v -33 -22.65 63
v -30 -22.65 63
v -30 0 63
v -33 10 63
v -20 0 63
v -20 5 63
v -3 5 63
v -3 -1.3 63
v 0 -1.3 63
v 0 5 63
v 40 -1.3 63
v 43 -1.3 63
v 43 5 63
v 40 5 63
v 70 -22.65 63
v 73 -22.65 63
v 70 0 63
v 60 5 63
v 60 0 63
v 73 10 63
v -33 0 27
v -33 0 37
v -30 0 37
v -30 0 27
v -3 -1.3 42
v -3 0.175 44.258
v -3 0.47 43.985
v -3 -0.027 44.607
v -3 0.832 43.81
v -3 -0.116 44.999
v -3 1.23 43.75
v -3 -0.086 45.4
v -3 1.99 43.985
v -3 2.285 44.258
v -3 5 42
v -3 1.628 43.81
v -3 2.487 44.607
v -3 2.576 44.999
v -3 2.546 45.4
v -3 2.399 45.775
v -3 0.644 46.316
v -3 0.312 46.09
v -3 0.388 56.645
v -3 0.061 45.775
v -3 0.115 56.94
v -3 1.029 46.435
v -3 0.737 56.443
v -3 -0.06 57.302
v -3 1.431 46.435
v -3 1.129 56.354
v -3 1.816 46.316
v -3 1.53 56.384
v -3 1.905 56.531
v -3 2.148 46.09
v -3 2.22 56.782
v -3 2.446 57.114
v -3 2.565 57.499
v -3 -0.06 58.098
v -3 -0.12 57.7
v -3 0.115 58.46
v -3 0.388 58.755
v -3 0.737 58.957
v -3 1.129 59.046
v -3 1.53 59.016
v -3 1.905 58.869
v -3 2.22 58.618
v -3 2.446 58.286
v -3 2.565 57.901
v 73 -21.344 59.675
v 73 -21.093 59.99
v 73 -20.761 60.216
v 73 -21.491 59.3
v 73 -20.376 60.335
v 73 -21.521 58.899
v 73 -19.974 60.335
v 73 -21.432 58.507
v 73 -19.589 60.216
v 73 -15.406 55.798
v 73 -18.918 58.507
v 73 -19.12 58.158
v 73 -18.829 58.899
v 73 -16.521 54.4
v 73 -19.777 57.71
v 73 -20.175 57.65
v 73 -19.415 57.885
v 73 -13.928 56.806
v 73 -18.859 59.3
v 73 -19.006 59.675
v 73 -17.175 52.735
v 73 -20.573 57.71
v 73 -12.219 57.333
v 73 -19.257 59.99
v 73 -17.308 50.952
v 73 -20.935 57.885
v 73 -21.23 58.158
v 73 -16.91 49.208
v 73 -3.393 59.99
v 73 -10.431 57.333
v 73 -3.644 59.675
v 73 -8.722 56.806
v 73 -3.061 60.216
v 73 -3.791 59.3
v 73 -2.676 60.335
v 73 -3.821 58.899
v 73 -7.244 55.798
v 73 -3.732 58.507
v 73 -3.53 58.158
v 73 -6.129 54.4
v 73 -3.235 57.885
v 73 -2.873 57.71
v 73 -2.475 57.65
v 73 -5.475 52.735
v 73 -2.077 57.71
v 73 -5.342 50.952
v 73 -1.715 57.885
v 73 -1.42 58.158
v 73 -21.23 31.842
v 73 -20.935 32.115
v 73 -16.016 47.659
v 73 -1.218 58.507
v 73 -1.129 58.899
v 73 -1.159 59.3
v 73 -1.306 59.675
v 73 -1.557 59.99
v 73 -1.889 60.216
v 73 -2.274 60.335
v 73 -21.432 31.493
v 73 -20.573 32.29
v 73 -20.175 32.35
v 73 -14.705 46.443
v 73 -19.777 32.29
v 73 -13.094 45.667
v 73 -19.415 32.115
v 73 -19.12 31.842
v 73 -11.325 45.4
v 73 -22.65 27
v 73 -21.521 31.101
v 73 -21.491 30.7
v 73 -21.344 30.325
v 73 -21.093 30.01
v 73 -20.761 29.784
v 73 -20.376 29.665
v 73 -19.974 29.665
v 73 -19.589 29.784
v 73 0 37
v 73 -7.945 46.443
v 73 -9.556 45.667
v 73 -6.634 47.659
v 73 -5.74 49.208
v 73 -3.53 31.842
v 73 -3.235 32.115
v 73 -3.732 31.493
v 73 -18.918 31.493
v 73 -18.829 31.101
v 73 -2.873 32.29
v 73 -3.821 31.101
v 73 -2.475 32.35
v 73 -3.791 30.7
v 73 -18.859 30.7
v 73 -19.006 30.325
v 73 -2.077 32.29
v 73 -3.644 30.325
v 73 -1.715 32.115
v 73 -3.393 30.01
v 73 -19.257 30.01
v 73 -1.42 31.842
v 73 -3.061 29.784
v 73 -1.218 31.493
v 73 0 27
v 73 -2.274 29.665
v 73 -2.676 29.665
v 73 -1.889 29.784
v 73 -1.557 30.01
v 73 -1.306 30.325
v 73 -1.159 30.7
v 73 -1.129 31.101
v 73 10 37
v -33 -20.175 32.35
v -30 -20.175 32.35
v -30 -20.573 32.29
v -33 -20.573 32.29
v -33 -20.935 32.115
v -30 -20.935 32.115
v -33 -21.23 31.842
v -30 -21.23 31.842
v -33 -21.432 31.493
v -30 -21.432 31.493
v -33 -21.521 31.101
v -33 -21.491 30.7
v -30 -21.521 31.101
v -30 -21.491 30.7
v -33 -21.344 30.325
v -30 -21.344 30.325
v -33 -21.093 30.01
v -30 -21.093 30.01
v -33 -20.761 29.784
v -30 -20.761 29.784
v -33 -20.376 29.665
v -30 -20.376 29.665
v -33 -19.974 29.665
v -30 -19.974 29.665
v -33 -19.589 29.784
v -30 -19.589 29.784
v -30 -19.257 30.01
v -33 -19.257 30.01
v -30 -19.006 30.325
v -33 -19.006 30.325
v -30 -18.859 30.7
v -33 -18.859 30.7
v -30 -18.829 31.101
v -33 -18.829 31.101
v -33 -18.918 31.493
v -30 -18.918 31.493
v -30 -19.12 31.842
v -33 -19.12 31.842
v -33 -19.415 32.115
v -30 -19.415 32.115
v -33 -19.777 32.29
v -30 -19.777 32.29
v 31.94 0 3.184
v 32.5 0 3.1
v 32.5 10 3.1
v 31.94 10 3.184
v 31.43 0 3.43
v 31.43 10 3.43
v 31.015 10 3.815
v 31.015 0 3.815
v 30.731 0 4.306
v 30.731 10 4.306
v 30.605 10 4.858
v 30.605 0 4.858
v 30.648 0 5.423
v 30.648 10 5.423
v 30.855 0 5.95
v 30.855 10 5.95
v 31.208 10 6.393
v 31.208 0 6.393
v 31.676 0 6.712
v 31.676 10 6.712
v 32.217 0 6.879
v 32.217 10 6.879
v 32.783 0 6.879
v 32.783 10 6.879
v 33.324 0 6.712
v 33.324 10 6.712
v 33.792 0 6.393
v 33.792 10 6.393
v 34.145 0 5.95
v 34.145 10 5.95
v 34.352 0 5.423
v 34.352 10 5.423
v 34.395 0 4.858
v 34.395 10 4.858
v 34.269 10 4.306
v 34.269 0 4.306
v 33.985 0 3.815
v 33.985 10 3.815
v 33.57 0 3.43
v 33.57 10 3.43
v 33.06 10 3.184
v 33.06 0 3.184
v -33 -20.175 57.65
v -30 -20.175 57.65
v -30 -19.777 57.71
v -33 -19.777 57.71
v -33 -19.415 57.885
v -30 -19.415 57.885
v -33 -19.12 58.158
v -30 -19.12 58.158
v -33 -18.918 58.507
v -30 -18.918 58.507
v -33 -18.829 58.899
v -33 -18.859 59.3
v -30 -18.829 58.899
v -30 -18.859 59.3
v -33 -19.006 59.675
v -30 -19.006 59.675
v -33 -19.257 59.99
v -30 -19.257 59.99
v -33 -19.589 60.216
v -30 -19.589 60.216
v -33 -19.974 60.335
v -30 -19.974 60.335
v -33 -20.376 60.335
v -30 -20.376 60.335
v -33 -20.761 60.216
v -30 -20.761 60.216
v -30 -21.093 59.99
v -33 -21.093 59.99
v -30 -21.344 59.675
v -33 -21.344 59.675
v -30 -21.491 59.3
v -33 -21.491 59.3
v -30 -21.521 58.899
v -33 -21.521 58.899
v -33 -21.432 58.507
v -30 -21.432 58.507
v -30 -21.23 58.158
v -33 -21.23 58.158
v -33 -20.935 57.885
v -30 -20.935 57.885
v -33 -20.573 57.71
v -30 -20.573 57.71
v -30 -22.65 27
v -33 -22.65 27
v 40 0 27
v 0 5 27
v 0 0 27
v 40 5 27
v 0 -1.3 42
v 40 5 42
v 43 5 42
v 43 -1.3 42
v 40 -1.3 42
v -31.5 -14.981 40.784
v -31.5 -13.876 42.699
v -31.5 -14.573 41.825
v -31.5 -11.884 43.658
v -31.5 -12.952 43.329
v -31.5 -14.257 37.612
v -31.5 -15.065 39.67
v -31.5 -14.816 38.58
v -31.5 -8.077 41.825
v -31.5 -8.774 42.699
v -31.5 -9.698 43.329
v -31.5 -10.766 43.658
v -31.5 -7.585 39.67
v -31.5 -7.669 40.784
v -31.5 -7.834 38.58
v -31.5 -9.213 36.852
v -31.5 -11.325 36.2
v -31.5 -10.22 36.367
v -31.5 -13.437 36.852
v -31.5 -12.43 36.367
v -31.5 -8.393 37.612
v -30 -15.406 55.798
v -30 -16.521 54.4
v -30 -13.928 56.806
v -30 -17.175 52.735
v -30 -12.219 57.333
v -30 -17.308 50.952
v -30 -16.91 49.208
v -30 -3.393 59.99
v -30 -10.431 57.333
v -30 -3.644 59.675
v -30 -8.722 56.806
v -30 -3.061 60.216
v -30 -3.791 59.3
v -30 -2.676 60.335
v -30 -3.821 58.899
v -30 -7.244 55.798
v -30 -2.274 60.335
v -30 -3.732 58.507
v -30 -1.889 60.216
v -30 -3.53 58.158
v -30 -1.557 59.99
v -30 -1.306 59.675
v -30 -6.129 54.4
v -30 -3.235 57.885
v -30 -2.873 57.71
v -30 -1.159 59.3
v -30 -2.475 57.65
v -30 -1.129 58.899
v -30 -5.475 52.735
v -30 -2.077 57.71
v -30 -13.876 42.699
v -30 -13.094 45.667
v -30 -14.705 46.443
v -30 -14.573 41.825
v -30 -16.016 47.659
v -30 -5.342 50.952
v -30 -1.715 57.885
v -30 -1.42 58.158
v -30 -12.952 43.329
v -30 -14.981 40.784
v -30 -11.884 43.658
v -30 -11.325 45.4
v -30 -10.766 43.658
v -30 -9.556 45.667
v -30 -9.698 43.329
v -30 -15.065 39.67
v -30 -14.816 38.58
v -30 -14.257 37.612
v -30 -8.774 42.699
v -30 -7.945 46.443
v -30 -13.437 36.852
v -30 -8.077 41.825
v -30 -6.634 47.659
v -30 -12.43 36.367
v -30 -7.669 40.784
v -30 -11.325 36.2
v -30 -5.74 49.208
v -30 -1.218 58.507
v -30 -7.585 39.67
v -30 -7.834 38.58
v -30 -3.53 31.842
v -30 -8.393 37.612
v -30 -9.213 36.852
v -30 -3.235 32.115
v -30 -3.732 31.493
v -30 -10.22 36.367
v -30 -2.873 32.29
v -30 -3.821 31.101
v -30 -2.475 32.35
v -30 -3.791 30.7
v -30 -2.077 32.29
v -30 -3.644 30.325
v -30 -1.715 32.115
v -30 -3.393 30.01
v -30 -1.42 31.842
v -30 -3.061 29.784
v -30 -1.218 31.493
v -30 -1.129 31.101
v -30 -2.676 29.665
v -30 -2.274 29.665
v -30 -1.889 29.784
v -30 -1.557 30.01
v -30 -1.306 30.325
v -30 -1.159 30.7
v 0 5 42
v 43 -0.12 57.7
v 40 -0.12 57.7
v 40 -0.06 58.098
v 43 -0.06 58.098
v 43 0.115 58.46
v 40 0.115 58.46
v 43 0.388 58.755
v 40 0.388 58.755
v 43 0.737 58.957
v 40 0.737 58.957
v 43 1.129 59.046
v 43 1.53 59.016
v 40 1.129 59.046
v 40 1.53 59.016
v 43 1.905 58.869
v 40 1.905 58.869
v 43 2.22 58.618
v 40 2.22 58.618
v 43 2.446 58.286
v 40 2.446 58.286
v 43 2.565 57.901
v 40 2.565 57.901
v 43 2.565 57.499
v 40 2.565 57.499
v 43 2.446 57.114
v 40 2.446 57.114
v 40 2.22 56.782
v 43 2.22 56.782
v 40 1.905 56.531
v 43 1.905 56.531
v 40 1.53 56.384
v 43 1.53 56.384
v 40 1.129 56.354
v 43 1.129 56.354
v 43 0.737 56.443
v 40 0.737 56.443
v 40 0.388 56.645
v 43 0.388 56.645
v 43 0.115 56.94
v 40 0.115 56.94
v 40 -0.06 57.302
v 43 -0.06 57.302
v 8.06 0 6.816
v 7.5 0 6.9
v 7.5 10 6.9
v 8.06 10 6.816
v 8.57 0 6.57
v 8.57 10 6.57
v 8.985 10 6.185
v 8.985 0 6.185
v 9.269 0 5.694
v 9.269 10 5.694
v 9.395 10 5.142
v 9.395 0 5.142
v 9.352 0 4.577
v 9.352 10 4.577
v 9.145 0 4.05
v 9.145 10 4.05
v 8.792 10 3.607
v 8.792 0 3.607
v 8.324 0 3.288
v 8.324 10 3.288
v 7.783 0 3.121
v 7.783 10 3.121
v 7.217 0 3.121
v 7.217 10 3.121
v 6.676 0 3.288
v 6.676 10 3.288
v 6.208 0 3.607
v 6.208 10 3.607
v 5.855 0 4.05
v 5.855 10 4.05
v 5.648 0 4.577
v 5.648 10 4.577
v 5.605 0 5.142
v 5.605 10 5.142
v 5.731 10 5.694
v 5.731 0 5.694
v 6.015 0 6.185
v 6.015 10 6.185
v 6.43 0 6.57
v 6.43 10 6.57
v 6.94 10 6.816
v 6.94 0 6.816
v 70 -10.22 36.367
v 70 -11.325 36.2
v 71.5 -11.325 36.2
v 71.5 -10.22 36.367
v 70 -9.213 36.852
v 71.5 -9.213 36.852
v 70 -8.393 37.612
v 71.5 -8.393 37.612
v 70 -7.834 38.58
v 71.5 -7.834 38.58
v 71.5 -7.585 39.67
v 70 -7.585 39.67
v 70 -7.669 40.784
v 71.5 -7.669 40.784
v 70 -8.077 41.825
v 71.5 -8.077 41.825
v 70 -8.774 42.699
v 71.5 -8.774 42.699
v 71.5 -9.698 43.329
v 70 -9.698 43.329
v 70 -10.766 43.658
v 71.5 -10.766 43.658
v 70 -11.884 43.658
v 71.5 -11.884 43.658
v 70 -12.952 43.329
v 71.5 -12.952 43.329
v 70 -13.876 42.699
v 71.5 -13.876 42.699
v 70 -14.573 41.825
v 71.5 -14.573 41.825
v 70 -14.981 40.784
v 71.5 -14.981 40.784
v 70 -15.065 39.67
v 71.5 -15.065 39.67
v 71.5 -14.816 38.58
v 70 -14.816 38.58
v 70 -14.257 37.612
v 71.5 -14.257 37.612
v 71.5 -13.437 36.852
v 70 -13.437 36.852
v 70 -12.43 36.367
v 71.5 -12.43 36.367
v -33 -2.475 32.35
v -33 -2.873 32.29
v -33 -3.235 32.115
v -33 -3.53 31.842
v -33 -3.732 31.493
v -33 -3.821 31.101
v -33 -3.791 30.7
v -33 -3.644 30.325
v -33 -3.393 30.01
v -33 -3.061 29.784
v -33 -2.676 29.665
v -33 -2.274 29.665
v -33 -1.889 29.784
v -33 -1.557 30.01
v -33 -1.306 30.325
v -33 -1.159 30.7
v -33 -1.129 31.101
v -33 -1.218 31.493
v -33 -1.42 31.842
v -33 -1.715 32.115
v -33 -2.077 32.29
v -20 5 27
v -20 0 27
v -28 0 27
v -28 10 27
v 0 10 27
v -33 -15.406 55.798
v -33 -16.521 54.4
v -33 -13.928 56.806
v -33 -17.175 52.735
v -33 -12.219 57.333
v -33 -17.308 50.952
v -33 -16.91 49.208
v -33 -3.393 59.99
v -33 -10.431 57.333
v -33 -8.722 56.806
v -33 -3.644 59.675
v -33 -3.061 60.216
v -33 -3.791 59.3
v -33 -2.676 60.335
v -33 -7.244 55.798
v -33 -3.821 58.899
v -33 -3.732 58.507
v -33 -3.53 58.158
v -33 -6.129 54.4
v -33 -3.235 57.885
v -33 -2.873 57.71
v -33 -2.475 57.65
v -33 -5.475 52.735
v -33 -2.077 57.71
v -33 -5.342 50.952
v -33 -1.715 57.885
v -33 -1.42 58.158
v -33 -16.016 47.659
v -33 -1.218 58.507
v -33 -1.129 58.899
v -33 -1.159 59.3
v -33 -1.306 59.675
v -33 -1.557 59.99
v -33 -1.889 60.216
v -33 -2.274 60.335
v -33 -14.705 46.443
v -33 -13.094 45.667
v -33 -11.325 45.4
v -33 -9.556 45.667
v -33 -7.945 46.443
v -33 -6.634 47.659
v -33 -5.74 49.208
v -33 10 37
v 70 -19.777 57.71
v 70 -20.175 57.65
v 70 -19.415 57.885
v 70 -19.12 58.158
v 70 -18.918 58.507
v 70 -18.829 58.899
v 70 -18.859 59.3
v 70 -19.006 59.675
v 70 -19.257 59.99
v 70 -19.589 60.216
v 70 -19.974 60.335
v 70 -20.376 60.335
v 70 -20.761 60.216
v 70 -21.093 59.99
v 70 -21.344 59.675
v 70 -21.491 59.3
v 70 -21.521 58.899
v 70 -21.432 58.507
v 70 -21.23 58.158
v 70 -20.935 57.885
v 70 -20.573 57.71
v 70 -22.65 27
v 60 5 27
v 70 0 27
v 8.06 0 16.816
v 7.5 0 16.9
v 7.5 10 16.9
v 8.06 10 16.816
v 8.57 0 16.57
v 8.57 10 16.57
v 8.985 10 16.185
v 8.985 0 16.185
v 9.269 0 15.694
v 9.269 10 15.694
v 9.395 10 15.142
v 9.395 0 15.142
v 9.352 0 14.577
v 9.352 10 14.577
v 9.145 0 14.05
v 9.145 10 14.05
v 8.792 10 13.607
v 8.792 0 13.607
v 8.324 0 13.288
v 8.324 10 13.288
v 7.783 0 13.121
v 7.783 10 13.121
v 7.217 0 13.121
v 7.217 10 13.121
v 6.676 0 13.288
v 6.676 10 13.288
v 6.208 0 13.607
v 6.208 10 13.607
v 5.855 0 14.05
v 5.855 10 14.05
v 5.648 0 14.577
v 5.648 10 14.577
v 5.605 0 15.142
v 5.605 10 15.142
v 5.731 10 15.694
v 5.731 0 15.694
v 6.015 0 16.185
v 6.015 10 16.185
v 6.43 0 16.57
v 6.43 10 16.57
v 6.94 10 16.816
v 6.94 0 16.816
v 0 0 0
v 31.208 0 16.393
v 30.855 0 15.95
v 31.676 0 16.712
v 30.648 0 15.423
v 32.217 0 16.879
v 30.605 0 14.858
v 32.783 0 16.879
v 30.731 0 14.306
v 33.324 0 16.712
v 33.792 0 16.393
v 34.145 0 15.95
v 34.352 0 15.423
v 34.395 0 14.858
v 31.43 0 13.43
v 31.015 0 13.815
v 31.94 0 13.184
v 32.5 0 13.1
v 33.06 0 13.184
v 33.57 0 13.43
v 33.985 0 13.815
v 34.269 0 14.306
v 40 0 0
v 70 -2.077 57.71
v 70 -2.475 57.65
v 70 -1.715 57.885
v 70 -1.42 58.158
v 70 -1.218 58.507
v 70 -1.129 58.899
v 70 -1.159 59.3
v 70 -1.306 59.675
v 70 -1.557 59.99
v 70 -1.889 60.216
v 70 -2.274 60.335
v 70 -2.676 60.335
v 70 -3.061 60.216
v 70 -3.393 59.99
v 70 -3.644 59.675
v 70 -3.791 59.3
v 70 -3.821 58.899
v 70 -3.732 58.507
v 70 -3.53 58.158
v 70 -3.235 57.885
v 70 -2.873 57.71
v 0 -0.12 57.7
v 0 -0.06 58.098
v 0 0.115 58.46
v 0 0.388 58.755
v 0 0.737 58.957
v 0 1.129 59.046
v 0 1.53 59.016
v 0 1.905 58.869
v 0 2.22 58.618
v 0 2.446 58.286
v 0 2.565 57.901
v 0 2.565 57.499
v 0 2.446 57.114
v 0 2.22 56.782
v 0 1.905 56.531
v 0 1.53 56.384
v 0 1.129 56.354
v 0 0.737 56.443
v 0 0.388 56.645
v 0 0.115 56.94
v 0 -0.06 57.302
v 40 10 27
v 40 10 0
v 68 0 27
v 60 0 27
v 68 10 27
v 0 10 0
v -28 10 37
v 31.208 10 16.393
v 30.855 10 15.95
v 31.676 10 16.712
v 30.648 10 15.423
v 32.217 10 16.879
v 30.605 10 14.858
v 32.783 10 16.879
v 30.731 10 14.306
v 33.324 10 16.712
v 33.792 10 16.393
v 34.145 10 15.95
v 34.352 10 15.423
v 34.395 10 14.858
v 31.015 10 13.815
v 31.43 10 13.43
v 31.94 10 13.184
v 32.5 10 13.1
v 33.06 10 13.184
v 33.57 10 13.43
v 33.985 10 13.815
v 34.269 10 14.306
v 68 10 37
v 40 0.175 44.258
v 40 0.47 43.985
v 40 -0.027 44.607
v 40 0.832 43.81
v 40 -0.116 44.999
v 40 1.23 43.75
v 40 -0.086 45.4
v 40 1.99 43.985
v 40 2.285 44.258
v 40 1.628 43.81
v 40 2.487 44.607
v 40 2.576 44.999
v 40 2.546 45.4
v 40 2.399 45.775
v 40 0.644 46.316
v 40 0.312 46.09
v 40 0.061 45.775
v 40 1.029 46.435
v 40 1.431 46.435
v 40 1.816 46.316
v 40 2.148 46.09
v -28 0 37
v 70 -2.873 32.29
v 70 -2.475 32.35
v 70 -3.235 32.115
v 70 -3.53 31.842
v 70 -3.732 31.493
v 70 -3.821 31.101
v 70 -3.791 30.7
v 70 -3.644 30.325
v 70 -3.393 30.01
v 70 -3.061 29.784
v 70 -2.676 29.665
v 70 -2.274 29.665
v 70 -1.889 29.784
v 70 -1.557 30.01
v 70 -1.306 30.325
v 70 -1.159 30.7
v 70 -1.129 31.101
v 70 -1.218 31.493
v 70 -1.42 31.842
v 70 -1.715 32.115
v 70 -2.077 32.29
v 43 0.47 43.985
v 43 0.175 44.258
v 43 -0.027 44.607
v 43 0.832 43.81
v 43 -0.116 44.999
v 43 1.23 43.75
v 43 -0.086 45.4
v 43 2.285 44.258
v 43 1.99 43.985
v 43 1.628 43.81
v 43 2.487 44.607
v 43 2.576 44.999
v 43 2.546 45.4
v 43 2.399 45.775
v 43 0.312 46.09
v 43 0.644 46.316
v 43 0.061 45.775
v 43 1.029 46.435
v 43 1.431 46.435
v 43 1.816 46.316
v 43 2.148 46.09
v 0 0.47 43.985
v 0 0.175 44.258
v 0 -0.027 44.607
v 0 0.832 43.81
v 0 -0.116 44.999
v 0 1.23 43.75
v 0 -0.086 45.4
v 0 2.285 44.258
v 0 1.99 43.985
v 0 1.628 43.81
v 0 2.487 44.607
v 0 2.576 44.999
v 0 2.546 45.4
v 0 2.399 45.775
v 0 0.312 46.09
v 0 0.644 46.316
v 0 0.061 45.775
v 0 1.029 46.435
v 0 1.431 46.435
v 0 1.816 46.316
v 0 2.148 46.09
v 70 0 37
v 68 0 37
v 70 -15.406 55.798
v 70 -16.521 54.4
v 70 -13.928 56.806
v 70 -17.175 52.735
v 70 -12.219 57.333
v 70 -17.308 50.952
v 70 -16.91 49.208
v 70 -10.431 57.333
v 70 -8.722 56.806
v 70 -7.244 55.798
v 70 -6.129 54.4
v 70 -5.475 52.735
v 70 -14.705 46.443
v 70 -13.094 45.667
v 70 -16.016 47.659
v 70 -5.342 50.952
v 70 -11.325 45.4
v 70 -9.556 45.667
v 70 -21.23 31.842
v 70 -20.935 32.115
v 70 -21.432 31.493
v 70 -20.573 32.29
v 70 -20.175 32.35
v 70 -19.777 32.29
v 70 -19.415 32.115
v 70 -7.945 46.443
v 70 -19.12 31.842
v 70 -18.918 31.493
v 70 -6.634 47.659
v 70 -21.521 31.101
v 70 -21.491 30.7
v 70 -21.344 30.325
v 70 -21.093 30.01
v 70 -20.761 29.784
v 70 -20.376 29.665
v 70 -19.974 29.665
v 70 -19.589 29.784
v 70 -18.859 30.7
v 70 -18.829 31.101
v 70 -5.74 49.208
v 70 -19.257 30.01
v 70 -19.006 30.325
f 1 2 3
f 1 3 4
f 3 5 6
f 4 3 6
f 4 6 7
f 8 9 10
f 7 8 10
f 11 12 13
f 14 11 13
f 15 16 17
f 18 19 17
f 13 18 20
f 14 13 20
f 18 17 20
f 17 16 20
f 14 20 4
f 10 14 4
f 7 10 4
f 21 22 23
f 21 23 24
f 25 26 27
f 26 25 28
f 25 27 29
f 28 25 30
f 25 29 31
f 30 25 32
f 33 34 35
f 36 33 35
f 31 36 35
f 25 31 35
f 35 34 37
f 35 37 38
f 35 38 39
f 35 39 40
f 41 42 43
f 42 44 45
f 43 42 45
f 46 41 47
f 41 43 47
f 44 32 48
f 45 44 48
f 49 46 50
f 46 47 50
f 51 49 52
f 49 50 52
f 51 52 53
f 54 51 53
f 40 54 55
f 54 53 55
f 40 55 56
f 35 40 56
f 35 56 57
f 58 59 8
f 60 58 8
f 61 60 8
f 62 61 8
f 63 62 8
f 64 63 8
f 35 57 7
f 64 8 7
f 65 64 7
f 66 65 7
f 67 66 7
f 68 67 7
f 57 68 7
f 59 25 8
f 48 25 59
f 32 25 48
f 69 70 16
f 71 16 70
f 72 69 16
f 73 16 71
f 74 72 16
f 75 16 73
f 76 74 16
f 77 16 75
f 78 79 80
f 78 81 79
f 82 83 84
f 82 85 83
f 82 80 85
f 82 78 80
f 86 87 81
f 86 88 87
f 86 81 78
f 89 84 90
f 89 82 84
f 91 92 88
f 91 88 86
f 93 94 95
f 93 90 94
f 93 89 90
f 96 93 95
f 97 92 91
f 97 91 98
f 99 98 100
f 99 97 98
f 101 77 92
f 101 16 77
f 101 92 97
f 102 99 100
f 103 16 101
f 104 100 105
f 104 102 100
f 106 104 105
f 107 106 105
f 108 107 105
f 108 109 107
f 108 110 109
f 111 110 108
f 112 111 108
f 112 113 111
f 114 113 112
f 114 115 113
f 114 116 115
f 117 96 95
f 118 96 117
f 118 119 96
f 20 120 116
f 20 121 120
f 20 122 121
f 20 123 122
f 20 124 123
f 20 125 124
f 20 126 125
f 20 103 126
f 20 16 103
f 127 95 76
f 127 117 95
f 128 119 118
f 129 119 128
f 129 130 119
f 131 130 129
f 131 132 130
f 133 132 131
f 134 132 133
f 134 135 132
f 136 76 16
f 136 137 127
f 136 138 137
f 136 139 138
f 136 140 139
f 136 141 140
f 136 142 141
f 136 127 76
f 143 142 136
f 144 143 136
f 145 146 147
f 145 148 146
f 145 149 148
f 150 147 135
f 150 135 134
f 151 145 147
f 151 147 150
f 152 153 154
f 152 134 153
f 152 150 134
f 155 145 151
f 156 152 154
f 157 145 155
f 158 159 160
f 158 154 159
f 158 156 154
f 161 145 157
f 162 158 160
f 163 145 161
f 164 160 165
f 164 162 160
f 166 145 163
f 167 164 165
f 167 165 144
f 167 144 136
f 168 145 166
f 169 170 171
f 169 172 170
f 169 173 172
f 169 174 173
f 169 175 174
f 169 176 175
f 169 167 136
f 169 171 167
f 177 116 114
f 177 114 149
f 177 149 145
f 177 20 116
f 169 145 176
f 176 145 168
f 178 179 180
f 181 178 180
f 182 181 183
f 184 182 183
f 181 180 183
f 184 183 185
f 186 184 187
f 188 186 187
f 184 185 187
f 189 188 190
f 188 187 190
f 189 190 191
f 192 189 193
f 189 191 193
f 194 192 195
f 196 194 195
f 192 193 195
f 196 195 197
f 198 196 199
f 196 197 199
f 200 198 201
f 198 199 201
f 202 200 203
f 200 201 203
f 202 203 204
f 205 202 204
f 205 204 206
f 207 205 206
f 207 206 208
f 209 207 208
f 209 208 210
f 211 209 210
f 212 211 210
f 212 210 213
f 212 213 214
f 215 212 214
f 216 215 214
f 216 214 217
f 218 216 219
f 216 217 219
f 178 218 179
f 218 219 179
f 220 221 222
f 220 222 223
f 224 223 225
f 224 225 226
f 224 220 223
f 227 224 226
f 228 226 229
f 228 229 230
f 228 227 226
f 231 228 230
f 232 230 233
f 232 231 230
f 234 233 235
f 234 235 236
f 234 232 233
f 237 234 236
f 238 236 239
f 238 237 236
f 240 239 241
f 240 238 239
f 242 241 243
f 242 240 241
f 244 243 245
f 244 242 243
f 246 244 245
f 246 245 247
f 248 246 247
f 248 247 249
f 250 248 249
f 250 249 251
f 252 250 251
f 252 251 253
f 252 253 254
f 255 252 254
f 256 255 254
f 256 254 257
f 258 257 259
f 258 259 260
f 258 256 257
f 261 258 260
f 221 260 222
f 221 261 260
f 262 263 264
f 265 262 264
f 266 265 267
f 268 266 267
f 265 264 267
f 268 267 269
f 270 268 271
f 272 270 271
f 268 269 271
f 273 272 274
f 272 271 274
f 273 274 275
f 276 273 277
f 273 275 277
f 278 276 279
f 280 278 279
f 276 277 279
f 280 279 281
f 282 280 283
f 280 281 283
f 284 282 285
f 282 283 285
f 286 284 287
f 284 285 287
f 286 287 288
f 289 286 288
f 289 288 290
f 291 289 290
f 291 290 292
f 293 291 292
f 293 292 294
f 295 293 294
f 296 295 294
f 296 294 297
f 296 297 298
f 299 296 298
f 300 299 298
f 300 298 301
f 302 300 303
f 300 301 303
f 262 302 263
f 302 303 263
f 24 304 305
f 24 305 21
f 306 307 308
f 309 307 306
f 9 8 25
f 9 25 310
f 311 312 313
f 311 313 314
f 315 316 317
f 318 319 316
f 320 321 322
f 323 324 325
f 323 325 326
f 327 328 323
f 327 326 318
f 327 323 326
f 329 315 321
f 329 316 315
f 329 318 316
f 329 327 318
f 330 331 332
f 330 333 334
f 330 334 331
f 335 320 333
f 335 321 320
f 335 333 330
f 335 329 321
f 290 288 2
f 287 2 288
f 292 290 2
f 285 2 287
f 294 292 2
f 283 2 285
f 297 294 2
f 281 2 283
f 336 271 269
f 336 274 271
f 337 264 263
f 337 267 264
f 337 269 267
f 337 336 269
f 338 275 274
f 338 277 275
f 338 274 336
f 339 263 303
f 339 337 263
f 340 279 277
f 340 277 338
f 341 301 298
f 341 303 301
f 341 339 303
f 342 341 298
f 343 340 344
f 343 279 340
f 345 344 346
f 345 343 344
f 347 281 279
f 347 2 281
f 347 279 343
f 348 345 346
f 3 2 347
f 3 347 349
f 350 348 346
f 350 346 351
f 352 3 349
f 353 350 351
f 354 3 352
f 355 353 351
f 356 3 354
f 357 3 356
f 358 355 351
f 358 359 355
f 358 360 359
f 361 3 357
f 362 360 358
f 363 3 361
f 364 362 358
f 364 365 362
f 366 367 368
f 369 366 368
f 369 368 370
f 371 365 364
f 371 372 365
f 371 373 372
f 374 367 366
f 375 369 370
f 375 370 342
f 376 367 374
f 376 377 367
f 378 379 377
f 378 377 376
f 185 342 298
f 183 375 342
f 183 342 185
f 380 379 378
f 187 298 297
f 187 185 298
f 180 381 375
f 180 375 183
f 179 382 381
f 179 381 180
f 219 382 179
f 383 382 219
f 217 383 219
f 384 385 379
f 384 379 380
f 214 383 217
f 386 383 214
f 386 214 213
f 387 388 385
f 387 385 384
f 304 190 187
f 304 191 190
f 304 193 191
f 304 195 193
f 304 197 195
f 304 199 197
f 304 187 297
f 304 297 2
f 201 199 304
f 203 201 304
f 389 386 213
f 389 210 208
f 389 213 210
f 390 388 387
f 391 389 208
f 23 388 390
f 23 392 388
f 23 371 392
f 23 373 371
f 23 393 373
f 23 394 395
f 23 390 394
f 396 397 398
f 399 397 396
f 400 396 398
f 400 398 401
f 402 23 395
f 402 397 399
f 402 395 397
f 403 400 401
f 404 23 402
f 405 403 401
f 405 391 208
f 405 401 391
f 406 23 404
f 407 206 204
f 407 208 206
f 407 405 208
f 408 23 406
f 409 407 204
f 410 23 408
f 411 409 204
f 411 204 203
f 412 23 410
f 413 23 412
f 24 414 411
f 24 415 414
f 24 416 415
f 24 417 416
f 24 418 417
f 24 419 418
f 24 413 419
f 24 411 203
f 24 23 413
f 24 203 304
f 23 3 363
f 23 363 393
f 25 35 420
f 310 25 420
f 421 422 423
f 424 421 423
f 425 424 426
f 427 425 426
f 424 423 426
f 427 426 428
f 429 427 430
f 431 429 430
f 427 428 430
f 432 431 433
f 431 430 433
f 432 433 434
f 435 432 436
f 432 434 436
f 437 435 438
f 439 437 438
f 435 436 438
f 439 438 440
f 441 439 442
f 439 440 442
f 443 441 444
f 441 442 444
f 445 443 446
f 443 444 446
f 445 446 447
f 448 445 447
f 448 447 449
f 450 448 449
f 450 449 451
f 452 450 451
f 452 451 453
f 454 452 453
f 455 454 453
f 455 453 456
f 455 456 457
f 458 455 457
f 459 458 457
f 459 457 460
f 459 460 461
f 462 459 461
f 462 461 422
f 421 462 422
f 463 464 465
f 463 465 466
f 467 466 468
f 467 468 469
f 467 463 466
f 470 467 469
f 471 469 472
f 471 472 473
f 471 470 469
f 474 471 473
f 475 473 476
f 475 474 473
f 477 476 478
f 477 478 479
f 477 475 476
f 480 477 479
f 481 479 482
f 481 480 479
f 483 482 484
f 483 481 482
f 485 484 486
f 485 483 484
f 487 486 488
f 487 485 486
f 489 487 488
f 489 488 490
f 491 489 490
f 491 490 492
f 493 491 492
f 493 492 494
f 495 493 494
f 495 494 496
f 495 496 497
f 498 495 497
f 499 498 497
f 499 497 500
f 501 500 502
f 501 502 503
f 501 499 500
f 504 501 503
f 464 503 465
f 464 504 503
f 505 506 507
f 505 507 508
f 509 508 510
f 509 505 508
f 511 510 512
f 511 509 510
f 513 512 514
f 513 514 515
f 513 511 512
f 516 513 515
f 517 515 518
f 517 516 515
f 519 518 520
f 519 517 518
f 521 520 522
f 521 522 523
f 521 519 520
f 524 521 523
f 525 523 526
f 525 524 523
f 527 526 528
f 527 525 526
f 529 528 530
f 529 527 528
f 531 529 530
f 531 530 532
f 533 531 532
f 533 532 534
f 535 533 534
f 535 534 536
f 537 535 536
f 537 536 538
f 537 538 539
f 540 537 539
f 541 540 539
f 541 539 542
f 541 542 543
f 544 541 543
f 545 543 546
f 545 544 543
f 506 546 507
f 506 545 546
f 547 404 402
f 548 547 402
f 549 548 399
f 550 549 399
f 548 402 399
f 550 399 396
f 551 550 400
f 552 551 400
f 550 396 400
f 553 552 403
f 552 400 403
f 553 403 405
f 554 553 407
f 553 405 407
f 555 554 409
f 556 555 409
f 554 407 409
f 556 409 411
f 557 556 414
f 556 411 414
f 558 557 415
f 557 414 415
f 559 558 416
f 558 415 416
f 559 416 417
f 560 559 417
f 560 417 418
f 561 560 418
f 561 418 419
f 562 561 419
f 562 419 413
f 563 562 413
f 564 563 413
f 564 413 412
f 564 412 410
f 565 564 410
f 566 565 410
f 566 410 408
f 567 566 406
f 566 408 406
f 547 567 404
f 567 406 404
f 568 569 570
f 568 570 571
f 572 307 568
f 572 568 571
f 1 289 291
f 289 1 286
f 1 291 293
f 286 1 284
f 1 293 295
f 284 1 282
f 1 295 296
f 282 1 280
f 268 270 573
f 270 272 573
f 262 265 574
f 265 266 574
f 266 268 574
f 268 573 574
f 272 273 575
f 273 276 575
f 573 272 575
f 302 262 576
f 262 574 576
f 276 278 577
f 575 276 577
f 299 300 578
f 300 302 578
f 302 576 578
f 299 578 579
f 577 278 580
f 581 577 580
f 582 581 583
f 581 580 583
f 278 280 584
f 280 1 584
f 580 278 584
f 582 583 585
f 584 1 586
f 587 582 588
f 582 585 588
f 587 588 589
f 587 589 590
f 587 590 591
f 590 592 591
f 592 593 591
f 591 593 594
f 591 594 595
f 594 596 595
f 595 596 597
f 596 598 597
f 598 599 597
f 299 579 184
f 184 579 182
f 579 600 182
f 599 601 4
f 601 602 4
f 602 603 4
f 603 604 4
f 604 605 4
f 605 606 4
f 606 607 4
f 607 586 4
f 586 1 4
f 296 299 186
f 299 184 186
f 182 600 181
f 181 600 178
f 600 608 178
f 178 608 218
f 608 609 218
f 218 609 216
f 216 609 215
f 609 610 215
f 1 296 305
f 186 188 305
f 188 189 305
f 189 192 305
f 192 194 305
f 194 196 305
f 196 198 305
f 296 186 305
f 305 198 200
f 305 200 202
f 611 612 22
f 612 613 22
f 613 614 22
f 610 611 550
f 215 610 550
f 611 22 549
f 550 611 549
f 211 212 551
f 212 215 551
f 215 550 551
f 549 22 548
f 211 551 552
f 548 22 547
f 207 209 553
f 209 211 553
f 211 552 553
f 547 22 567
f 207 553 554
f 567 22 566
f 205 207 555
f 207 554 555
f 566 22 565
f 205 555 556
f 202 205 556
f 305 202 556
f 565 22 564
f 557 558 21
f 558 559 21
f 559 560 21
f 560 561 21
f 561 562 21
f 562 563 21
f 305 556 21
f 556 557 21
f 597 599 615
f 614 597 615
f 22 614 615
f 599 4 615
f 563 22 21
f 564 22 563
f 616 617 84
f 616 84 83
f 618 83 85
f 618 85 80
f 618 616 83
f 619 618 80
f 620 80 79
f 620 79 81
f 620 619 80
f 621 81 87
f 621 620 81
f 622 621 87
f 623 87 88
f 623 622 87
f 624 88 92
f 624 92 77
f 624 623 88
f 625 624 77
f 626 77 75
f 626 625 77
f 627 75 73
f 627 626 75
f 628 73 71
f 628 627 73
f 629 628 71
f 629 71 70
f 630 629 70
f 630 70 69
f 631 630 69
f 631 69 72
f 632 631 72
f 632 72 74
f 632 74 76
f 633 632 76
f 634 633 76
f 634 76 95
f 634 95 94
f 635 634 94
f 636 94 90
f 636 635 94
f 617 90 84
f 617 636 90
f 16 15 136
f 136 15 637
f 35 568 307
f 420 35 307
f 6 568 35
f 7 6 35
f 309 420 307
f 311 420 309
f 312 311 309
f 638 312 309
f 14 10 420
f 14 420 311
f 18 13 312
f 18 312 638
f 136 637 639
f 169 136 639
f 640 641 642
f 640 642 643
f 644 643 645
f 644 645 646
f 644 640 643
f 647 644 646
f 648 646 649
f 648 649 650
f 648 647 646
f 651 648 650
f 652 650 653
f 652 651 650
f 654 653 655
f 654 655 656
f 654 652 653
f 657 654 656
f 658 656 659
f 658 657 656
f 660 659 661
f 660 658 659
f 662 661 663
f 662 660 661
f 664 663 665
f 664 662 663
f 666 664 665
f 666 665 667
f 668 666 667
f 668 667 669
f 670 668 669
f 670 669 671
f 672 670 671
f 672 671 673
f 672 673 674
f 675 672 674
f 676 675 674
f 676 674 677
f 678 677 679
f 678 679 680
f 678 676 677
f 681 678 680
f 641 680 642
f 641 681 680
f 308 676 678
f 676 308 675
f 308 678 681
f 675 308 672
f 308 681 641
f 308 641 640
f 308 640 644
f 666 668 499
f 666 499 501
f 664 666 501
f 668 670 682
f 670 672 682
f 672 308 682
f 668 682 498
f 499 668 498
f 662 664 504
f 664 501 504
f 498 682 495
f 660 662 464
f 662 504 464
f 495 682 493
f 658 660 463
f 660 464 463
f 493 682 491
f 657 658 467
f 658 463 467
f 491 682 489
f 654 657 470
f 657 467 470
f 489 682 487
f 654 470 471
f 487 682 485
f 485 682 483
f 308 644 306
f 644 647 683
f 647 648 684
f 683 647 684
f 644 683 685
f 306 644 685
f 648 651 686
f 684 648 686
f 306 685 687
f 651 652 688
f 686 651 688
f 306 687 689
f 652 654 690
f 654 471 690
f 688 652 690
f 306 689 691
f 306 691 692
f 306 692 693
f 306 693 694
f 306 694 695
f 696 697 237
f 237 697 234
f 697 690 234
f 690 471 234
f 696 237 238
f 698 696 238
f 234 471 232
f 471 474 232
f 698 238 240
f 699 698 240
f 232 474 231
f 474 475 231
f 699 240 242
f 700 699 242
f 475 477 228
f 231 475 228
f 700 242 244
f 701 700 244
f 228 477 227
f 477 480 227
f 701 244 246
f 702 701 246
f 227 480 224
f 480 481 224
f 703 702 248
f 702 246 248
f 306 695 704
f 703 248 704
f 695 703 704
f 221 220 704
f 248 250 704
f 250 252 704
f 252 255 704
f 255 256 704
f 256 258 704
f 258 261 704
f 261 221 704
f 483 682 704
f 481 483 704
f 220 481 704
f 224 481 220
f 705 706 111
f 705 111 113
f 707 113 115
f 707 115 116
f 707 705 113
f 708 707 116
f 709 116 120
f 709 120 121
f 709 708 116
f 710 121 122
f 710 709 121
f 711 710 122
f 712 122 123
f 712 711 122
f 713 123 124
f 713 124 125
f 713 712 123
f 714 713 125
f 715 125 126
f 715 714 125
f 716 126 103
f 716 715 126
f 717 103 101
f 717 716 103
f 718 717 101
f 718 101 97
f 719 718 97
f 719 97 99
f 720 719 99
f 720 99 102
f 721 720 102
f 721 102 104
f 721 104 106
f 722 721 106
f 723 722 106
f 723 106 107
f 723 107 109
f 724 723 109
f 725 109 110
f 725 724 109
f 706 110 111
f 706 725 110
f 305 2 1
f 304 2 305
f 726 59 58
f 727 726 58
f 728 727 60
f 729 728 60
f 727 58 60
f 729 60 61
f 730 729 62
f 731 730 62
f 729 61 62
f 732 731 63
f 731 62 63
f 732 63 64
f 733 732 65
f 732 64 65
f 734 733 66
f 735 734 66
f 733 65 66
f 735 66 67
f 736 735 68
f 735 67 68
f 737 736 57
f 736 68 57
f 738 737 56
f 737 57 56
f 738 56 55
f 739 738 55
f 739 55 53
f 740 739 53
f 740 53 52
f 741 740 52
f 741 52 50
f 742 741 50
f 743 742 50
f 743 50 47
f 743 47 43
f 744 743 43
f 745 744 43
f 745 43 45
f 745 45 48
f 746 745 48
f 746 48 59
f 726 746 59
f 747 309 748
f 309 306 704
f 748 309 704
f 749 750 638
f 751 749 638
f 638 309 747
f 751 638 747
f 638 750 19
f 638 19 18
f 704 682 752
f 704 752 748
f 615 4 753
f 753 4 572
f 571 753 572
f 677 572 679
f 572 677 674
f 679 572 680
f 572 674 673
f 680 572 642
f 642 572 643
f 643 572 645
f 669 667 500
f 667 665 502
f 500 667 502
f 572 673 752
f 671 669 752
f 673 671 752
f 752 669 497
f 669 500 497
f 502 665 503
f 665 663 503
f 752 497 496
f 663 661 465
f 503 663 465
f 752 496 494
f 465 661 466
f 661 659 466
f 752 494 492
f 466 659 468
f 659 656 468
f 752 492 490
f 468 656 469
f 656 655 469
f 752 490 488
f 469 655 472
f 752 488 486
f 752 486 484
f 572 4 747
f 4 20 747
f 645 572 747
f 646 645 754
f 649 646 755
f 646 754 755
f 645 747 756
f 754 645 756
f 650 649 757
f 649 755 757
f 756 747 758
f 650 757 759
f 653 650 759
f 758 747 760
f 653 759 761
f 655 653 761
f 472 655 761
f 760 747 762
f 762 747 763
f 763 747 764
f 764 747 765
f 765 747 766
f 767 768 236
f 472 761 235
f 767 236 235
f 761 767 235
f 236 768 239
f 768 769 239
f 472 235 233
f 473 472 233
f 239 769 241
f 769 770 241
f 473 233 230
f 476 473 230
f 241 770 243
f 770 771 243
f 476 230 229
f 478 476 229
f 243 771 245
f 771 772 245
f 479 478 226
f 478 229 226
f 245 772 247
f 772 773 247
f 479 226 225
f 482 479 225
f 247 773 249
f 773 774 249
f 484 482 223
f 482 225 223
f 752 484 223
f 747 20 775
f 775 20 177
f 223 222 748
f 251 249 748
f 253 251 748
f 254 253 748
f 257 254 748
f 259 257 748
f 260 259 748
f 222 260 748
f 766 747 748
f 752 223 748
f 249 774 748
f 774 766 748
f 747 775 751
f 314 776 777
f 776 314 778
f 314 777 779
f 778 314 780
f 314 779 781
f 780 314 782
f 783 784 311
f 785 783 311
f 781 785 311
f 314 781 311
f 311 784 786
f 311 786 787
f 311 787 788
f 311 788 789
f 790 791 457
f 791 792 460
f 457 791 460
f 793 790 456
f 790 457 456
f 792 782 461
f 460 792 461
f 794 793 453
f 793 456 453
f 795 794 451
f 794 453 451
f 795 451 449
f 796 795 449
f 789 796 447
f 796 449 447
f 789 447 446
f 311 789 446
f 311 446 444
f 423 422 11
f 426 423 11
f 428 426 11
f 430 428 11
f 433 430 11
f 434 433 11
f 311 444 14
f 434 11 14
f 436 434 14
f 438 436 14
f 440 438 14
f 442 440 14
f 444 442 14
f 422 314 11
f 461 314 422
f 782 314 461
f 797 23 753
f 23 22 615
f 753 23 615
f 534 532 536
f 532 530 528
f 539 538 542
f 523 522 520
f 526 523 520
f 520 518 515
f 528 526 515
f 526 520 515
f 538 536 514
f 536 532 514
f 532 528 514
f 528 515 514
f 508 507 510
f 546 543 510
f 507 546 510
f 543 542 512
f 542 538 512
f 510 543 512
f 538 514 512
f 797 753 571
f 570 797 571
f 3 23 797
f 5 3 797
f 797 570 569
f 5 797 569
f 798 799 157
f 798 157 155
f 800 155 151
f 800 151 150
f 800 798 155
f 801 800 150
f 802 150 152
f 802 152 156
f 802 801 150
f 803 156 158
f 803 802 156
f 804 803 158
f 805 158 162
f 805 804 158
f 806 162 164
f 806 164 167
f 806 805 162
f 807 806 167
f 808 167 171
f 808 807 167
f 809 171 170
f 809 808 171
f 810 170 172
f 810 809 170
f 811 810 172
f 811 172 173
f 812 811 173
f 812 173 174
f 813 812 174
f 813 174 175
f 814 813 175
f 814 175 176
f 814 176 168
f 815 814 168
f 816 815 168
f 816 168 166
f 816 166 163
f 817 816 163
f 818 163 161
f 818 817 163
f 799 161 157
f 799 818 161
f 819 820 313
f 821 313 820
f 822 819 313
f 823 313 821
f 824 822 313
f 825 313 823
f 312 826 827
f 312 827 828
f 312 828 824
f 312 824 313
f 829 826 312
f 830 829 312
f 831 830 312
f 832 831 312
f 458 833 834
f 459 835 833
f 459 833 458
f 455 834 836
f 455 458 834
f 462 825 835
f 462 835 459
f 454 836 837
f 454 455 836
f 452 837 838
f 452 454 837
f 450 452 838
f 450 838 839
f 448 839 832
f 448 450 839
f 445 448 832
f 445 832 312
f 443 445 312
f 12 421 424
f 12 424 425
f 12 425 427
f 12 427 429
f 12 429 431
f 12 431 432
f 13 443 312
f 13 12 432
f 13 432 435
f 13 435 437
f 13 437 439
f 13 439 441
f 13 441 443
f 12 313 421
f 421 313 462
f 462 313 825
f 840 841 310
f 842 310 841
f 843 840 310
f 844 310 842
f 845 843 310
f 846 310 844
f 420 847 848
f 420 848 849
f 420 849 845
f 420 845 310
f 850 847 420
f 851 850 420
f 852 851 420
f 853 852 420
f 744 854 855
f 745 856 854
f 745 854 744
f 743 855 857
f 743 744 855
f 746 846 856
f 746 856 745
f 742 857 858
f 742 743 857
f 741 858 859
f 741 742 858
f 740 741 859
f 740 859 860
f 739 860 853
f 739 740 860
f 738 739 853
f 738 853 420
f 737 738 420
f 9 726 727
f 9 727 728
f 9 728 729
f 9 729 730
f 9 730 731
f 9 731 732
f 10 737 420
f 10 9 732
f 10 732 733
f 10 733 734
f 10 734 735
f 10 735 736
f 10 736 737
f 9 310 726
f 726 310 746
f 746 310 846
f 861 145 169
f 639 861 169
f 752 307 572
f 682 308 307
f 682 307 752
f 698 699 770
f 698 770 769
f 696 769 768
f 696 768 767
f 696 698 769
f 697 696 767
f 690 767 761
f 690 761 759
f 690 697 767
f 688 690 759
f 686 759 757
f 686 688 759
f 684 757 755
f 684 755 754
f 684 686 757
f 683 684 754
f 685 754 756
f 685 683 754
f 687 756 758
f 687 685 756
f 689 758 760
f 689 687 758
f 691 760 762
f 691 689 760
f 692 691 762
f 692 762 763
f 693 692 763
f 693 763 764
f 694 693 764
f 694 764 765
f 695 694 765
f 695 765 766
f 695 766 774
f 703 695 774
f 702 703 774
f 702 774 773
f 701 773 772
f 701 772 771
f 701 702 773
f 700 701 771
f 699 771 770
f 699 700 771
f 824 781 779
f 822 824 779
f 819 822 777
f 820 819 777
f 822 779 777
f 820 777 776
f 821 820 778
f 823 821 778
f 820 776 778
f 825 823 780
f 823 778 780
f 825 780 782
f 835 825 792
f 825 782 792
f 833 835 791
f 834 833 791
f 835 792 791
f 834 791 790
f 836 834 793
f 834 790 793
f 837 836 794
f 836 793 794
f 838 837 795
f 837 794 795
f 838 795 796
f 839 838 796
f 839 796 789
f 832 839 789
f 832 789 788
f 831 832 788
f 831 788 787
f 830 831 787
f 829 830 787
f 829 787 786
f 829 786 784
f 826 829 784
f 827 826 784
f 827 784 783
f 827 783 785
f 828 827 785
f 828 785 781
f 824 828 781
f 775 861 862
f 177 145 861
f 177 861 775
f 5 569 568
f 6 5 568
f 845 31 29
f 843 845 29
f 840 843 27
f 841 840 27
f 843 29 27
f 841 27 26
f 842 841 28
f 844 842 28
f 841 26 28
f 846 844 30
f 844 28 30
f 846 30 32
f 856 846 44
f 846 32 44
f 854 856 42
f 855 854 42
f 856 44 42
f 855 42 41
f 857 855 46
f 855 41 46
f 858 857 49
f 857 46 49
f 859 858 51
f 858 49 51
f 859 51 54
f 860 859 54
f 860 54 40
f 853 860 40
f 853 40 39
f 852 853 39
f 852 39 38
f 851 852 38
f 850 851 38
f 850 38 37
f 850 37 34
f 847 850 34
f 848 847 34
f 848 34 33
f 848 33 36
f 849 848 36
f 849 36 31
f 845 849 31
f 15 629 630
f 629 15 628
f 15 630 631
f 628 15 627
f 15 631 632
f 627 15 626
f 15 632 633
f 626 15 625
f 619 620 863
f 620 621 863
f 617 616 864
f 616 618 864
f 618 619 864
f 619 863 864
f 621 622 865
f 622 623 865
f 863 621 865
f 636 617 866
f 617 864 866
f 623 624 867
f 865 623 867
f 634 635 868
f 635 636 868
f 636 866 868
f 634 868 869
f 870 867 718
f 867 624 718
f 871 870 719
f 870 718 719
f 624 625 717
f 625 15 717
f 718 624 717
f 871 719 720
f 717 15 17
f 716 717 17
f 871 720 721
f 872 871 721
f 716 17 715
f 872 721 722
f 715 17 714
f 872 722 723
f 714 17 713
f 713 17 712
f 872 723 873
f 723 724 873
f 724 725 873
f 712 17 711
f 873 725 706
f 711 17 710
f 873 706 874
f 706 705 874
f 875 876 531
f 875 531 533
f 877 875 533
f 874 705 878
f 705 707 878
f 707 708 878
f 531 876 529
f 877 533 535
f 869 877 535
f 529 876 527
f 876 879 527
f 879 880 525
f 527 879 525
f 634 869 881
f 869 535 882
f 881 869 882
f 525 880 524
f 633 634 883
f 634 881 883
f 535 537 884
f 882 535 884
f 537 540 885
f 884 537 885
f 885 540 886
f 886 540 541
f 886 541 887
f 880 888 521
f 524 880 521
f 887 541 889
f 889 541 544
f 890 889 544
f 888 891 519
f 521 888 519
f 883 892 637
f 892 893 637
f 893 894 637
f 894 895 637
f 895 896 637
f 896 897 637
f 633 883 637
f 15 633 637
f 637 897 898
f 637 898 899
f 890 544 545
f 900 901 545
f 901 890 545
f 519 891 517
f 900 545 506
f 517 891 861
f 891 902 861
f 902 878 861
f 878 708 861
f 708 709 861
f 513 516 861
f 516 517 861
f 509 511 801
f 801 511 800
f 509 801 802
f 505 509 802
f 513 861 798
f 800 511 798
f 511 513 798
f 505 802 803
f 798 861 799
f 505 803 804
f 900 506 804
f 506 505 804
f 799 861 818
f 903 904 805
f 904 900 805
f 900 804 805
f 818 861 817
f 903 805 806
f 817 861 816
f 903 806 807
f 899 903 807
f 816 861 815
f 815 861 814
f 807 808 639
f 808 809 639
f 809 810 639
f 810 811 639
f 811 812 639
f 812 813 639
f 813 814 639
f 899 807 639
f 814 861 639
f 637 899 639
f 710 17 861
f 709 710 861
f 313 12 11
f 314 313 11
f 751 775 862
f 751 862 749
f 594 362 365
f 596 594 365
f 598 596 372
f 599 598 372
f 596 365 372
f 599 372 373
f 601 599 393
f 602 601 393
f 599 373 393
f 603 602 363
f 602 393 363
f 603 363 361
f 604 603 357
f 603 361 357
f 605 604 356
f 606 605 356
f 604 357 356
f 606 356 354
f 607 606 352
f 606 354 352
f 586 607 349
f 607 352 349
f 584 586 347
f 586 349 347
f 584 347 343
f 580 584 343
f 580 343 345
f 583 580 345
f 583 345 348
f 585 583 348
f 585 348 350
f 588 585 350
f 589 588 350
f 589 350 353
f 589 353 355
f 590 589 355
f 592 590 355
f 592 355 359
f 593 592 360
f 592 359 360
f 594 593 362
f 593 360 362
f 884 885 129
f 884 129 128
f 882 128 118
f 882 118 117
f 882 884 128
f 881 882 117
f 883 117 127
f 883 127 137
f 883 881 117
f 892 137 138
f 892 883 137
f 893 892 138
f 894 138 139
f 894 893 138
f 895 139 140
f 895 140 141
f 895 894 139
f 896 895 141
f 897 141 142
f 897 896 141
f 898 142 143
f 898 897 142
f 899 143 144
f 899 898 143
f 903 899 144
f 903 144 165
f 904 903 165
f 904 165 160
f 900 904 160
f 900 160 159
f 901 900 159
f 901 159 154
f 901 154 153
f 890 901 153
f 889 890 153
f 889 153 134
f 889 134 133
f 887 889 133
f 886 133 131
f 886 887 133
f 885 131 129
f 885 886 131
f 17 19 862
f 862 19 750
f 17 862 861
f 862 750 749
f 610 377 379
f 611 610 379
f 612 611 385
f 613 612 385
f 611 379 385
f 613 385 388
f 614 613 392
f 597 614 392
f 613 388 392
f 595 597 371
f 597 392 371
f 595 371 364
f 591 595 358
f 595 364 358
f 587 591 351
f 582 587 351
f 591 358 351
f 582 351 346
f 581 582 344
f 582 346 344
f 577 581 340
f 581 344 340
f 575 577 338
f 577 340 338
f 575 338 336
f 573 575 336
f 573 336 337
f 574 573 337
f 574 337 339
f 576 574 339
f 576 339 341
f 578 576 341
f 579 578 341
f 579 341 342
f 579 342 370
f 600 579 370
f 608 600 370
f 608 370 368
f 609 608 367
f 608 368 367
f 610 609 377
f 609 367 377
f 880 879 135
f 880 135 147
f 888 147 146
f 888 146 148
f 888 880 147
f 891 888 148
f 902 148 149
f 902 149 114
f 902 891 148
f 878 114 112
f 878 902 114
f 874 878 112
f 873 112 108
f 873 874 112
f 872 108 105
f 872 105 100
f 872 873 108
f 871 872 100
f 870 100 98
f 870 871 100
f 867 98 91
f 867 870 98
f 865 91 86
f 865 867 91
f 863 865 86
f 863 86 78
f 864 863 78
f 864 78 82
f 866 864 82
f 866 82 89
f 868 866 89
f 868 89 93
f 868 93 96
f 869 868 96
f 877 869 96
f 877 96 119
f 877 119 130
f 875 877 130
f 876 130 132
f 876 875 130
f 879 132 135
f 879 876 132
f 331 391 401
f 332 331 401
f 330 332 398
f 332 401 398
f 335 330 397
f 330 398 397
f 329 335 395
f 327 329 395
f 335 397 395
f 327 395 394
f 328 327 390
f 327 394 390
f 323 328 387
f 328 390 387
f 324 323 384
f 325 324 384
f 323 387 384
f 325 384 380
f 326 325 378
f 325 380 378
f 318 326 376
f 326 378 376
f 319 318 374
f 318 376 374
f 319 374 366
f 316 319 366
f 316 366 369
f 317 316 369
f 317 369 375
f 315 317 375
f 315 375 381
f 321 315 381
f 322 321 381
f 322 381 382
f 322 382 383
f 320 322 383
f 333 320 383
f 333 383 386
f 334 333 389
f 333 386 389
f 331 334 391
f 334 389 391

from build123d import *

# Parameters (mm, degrees)
SKETCH1_W           = 40
SKETCH1_H           = 27
SKETCH1_R           = 1.9
BOSS_EXTRUDE3_DEPTH = 10
SKETCH5_W           = 100
SKETCH5_H           = 36
BOSS_EXTRUDE4_DEPTH = 10
SKETCH6_W           = 36
SKETCH6_H           = 32.65
SKETCH6_R           = 1.35
SKETCH6_R_2         = 6
BOSS_EXTRUDE6_DEPTH = 3
SKETCH7_W           = 80
SKETCH7_H           = 10
CUT_EXTRUDE1_DEPTH  = 36
SKETCH8_W           = 3
SKETCH8_H           = 6.3
BOSS_EXTRUDE7_DEPTH = 21
SKETCH10_R          = 1.35
CUT_EXTRUDE3_DEPTH  = 46
SKETCH11_R          = 3.75
CUT_EXTRUDE4_DEPTH  = 1.5
SKETCH12_W          = 10
SKETCH12_H          = 10
CUT_EXTRUDE5_DEPTH  = 5


with BuildPart() as part:
    # Sketch1 → Boss-Extrude3 (new body)
    with BuildSketch(Plane(origin=(0, 0, 0), x_dir=(1, 0, 0), z_dir=(0, 1, 0))):
        with Locations((20, -13.5)):
            Rectangle(SKETCH1_W, SKETCH1_H)
        with Locations(Location((7.5, -5, 0), (0, 0, 270))):
            Circle(SKETCH1_R, mode=Mode.SUBTRACT)
        with Locations(Location((7.5, -15, 0), (0, 0, 270))):
            Circle(SKETCH1_R, mode=Mode.SUBTRACT)
        with Locations(Location((32.5, -15, 0), (0, 0, 90))):
            Circle(SKETCH1_R, mode=Mode.SUBTRACT)
        with Locations(Location((32.5, -5, 0), (0, 0, 90))):
            Circle(SKETCH1_R, mode=Mode.SUBTRACT)
    extrude(amount=BOSS_EXTRUDE3_DEPTH)

    # Sketch5 → Boss-Extrude4 (add)
    with BuildSketch(Plane(origin=(0, 10, 0), x_dir=(1, 0, 0), z_dir=(0, 1, 0))):
        with Locations((20, -45)):
            Rectangle(SKETCH5_W, SKETCH5_H)
    extrude(amount=-BOSS_EXTRUDE4_DEPTH)

    # Sketch6 → Boss-Extrude6 (add)
    with BuildSketch(Plane(origin=(70, 0, 0), x_dir=(0, 0, -1), z_dir=(1, 0, 0))):
        with Locations((-45, -6.325)):
            Rectangle(SKETCH6_W, SKETCH6_H)
        with Locations((-59, -20.175)):
            Circle(SKETCH6_R, mode=Mode.SUBTRACT)
        with Locations((-59, -2.475)):
            Circle(SKETCH6_R, mode=Mode.SUBTRACT)
        with Locations(Location((-31, -20.175, 0), (0, 0, 180))):
            Circle(SKETCH6_R, mode=Mode.SUBTRACT)
        with Locations(Location((-31, -2.475, 0), (0, 0, 180))):
            Circle(SKETCH6_R, mode=Mode.SUBTRACT)
        with Locations((-51.4, -11.325)):
            Circle(SKETCH6_R_2, mode=Mode.SUBTRACT)
    boss_extrude6 = extrude(amount=BOSS_EXTRUDE6_DEPTH)

    # Mirror1: Boss-Extrude6 across plane
    add(boss_extrude6.mirror(Plane(origin=(20, 0, 0), x_dir=(0, 0, 1), z_dir=(1, 0, 0))))

    # Sketch7 → Cut-Extrude1 (cut)
    with BuildSketch(Plane.XY.offset(63)):
        with Locations((20, 0)):
            Rectangle(SKETCH7_W, SKETCH7_H)
    extrude(amount=-CUT_EXTRUDE1_DEPTH, mode=Mode.SUBTRACT)

    # Sketch8 → Boss-Extrude7 (add)
    with BuildSketch(Plane.XY.offset(63)):
        with Locations((-1.5, 1.85)):
            Rectangle(SKETCH8_W, SKETCH8_H)
    boss_extrude7 = extrude(amount=-BOSS_EXTRUDE7_DEPTH)

    # Mirror2: Boss-Extrude7 across plane
    add(boss_extrude7.mirror(Plane(origin=(20, 0, 0), x_dir=(0, 0, 1), z_dir=(1, 0, 0))))

    # Sketch10 → Cut-Extrude3 (cut)
    with BuildSketch(Plane.ZY.offset(3)):
        with Locations(Location((57.7, 1.23, 0), (0, 0, 270))):
            Circle(SKETCH10_R)
        with Locations(Location((45.1, 1.23, 0), (0, 0, 180))):
            Circle(SKETCH10_R)
    extrude(amount=-CUT_EXTRUDE3_DEPTH, mode=Mode.SUBTRACT)

    # Sketch11 → Cut-Extrude4 (cut)
    with BuildSketch(Plane(origin=(-30, 0, 0), x_dir=(0, 0, -1), z_dir=(1, 0, 0))):
        with Locations((-39.95, -11.325)):
            Circle(SKETCH11_R)
    cut_extrude4 = extrude(amount=-CUT_EXTRUDE4_DEPTH, mode=Mode.SUBTRACT)

    # Mirror3: Cut-Extrude4 across plane
    add(cut_extrude4.mirror(Plane(origin=(20, 0, 0), x_dir=(0, 0, 1), z_dir=(1, 0, 0))), mode=Mode.SUBTRACT)

    # Sketch12 → Cut-Extrude5 (cut)
    with BuildSketch(Plane(origin=(73, 0, 0), x_dir=(0, 0, -1), z_dir=(1, 0, 0))):
        with Locations((-32, 5)):
            Rectangle(SKETCH12_W, SKETCH12_H)
    cut_extrude5 = extrude(amount=-CUT_EXTRUDE5_DEPTH, mode=Mode.SUBTRACT)

    # Mirror4: Cut-Extrude5 across plane
    add(cut_extrude5.mirror(Plane(origin=(20, 0, 0), x_dir=(0, 0, 1), z_dir=(1, 0, 0))), mode=Mode.SUBTRACT)


solid = part.part
